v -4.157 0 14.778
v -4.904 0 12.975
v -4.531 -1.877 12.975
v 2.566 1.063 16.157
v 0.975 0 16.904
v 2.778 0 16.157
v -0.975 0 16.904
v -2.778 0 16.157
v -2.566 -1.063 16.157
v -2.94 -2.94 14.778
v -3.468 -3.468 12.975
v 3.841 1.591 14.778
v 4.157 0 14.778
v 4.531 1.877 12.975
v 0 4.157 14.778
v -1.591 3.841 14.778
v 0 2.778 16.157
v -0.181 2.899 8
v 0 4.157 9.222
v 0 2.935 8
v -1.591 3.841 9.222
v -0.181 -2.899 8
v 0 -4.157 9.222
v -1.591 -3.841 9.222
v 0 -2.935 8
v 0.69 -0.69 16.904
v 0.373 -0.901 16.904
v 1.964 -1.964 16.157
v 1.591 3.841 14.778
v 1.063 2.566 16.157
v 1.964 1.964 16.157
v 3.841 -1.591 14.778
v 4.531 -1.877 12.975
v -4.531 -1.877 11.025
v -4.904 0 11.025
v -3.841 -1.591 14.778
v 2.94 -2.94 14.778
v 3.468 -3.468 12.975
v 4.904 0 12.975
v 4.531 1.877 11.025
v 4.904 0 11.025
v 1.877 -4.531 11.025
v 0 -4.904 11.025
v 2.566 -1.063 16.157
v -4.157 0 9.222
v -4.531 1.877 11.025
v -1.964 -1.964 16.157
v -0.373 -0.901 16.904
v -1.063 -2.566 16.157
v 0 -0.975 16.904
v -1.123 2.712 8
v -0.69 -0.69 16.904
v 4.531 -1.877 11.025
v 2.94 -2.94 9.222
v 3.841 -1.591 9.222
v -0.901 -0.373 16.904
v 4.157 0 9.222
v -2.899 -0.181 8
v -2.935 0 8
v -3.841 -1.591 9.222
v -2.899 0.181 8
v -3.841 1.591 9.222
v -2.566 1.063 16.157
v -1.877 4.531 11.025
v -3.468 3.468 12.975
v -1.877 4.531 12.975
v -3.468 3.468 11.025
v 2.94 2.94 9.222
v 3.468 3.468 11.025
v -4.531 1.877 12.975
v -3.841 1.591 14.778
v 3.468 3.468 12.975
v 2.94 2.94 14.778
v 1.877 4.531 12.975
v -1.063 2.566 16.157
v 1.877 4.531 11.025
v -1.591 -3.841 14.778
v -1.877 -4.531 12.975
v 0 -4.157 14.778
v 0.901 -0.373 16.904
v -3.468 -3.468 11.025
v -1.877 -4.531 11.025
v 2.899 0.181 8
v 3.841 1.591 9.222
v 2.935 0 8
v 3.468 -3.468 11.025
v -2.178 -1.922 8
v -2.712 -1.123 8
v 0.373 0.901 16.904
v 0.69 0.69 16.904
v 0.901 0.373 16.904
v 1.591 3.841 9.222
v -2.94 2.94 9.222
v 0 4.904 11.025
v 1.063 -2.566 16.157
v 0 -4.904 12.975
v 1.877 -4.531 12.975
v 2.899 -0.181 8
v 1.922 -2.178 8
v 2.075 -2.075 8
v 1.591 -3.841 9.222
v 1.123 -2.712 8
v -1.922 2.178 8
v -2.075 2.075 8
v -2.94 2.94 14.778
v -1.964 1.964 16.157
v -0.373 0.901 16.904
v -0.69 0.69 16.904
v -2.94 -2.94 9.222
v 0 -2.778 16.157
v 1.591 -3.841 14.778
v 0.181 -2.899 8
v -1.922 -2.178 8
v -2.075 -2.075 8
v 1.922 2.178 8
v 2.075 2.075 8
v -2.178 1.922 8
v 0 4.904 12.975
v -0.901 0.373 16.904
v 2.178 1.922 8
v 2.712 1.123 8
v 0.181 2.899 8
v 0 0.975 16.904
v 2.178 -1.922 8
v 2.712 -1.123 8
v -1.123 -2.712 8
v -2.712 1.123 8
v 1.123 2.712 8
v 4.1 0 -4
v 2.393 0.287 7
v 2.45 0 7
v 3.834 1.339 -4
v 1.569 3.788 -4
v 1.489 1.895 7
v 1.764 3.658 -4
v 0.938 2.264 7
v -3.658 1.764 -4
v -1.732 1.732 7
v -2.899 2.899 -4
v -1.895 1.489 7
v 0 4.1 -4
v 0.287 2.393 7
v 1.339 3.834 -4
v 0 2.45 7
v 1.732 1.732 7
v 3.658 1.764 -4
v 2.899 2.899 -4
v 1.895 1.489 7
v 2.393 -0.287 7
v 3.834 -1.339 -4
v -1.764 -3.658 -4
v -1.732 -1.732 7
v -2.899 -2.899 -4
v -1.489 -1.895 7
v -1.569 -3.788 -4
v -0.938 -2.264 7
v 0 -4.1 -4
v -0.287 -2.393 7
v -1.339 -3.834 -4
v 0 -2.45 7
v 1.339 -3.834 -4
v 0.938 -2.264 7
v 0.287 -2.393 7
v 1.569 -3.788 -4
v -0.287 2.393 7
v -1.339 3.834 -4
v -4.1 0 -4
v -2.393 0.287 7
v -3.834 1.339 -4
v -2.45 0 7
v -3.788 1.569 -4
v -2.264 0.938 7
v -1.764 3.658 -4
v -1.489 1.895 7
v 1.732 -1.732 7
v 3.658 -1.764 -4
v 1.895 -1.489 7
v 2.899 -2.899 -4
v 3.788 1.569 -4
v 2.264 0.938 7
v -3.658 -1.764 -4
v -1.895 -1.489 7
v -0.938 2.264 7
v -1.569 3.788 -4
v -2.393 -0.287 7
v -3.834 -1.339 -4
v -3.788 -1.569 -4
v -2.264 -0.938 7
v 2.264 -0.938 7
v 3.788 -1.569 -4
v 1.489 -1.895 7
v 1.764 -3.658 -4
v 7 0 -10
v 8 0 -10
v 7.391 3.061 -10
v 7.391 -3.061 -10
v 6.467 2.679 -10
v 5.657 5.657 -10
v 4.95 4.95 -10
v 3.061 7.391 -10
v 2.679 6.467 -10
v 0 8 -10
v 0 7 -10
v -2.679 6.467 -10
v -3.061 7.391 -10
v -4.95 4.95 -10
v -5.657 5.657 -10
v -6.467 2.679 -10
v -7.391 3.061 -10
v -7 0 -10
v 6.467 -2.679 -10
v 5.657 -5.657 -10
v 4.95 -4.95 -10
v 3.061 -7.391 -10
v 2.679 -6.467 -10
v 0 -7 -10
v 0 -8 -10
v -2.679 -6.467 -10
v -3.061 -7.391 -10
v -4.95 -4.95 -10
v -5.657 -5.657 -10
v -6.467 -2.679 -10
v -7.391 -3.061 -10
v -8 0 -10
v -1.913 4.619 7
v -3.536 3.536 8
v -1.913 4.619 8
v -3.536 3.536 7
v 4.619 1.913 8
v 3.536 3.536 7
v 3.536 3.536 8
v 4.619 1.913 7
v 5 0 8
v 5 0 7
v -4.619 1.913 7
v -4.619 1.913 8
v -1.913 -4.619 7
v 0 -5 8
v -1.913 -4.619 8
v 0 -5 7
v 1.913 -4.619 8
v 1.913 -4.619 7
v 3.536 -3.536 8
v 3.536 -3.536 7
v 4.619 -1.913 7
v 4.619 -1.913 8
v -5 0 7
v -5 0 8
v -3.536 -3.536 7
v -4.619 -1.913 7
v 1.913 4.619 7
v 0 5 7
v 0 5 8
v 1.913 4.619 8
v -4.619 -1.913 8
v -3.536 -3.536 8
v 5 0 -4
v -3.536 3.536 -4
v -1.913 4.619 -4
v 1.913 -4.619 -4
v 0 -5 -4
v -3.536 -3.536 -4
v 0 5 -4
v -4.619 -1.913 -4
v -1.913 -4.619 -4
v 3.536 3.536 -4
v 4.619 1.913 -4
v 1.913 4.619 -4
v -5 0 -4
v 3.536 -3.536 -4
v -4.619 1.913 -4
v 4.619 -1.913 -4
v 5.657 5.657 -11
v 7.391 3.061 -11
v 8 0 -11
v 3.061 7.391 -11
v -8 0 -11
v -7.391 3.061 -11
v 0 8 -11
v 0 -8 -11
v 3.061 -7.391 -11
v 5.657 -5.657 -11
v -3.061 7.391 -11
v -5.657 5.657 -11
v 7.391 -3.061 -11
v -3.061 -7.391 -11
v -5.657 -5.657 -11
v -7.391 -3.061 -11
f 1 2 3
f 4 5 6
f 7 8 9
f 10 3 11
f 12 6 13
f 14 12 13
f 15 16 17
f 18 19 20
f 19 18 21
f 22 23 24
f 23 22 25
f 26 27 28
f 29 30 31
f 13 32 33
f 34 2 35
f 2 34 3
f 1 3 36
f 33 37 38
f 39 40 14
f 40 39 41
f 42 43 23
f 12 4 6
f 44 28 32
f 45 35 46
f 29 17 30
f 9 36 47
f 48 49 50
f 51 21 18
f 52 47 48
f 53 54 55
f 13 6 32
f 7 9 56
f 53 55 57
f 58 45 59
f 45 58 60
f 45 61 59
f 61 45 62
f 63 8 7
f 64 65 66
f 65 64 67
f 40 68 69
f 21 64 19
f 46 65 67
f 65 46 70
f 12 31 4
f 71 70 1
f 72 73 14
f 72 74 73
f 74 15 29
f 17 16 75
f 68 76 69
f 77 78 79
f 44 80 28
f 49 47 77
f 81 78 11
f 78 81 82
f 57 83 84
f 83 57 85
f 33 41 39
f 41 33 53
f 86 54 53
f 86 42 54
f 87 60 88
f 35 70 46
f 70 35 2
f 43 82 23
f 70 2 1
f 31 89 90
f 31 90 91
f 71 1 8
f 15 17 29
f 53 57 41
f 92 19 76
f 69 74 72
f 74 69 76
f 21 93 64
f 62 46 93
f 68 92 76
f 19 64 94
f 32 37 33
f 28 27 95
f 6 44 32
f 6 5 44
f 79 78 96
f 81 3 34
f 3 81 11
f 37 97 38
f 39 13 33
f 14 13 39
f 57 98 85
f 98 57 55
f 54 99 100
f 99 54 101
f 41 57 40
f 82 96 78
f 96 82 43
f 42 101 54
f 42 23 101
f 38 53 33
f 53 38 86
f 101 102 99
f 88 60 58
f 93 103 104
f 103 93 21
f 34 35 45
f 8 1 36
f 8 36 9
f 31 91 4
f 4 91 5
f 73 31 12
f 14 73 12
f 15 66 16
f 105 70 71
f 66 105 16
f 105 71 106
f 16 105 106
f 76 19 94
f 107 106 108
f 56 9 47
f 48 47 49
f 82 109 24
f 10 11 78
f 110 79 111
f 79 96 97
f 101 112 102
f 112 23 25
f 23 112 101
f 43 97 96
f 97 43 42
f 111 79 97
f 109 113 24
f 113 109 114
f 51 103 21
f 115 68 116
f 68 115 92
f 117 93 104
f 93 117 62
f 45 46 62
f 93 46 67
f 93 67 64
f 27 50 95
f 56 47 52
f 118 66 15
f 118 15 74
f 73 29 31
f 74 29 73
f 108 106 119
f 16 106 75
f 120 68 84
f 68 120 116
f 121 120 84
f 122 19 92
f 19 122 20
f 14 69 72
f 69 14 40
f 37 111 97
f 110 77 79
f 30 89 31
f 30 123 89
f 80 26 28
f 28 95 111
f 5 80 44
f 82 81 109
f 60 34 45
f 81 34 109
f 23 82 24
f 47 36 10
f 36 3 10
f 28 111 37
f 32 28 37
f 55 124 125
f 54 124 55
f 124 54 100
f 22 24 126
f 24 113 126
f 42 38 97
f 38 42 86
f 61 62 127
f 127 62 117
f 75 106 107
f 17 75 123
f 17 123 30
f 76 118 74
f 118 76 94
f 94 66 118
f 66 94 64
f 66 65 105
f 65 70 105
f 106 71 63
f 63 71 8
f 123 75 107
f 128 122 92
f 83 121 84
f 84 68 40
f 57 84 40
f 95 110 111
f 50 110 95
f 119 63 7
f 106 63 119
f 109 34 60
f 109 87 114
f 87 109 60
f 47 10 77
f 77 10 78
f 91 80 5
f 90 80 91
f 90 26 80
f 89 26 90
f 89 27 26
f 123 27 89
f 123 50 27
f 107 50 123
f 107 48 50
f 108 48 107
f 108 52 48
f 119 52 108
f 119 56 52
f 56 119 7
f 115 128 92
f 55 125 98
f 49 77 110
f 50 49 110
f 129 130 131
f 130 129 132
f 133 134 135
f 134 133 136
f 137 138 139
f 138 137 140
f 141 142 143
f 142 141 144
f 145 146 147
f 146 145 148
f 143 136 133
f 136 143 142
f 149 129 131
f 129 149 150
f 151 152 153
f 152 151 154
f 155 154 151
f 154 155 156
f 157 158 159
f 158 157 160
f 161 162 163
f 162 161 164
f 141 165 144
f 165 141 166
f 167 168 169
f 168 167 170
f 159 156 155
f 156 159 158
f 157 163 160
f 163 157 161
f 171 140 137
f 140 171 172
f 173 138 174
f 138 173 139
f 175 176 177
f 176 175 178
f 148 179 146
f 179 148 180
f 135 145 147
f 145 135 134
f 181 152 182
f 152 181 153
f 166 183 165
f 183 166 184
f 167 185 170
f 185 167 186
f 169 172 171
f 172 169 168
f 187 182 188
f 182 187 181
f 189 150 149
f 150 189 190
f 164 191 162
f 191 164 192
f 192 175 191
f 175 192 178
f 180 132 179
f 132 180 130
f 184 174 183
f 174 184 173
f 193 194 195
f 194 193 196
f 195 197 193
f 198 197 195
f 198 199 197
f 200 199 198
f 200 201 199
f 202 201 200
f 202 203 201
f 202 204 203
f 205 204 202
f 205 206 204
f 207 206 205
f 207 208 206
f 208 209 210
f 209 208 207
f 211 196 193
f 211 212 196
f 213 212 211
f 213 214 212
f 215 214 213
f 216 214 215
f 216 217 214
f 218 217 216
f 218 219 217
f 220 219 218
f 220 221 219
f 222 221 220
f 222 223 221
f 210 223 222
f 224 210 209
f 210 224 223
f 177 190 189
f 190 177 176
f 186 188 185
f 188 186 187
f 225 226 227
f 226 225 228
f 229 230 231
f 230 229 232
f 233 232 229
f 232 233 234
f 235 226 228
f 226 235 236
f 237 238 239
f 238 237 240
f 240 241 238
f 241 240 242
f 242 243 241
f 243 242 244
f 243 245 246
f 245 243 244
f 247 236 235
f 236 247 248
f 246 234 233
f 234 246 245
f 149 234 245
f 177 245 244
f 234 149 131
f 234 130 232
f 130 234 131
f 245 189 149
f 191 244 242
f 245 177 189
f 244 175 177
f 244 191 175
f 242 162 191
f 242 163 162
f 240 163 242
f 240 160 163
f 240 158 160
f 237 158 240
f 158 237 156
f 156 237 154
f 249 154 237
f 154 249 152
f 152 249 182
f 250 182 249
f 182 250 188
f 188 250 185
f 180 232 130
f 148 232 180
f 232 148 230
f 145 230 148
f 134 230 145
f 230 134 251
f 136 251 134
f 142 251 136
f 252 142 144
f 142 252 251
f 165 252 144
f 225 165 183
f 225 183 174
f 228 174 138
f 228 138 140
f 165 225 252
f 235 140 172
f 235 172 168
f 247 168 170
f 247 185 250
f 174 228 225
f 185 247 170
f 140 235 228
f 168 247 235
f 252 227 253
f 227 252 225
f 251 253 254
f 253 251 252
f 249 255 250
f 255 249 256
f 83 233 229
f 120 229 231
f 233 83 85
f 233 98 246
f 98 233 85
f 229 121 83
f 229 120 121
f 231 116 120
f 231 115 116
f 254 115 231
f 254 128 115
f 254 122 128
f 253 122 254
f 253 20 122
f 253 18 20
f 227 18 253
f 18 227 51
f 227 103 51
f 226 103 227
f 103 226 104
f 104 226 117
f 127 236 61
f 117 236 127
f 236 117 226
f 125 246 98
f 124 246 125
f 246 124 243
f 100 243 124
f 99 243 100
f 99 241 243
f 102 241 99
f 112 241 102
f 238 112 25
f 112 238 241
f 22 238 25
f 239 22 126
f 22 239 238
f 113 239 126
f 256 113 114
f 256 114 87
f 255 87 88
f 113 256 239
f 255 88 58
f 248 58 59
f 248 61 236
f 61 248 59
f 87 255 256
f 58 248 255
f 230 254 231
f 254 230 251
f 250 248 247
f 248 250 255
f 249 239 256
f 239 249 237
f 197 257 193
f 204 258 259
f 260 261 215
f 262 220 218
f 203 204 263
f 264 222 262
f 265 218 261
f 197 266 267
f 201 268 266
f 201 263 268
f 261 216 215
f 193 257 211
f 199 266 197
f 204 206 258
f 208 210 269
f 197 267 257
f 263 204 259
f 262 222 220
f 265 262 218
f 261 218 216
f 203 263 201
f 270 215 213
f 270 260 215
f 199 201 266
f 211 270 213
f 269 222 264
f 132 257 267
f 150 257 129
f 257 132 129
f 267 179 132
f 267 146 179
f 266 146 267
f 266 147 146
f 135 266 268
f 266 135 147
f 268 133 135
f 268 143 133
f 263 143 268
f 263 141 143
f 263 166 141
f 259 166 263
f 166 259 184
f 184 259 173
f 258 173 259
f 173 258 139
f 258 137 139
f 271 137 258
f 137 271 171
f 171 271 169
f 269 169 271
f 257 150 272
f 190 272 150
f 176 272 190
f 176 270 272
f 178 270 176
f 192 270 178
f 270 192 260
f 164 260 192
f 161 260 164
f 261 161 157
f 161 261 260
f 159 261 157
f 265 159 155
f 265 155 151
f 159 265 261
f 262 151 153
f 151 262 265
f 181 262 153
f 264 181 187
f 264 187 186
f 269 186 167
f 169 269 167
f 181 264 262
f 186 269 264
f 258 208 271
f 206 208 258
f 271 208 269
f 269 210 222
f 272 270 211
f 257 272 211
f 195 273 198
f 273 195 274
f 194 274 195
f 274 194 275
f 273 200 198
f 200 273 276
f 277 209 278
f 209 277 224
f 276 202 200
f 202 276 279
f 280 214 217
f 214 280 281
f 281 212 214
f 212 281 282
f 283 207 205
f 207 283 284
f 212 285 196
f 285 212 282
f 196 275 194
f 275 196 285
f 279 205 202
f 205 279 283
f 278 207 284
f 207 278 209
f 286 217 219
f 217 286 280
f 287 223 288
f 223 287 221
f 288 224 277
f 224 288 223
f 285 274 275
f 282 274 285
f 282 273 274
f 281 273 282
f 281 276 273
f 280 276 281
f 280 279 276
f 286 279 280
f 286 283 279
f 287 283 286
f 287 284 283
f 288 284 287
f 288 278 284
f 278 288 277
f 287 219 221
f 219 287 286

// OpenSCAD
// [FL_INDEX: keywords="openscad, 3d_parametric, Chess_Pawn_Customizer, csg_solid" | COT="Parametric OpenSCAD design from 3DCodeverse"]
// Title: Chess Pawn Customizer

resolution=16;//[2:128]
size=5;//[2:100]
pawn(size, resolution);
module pawn(s, res){
$fn=res;
translate([0, 0, 12/5*s])
sphere(r=s);
cylinder(h = s*4, r1 = s, r2 = 2/5*s, center = true);
translate([0, 0, 7/5*s])
cylinder(h = 1/5*s, r=s);
translate([0, 0, -2*s])
cylinder(h = 6/5*s, r1 = 7/5*s, r2 = s);
translate([0, 0, -11/5*s])
cylinder(h = 1/5*s, r= 8/5*s);
}
